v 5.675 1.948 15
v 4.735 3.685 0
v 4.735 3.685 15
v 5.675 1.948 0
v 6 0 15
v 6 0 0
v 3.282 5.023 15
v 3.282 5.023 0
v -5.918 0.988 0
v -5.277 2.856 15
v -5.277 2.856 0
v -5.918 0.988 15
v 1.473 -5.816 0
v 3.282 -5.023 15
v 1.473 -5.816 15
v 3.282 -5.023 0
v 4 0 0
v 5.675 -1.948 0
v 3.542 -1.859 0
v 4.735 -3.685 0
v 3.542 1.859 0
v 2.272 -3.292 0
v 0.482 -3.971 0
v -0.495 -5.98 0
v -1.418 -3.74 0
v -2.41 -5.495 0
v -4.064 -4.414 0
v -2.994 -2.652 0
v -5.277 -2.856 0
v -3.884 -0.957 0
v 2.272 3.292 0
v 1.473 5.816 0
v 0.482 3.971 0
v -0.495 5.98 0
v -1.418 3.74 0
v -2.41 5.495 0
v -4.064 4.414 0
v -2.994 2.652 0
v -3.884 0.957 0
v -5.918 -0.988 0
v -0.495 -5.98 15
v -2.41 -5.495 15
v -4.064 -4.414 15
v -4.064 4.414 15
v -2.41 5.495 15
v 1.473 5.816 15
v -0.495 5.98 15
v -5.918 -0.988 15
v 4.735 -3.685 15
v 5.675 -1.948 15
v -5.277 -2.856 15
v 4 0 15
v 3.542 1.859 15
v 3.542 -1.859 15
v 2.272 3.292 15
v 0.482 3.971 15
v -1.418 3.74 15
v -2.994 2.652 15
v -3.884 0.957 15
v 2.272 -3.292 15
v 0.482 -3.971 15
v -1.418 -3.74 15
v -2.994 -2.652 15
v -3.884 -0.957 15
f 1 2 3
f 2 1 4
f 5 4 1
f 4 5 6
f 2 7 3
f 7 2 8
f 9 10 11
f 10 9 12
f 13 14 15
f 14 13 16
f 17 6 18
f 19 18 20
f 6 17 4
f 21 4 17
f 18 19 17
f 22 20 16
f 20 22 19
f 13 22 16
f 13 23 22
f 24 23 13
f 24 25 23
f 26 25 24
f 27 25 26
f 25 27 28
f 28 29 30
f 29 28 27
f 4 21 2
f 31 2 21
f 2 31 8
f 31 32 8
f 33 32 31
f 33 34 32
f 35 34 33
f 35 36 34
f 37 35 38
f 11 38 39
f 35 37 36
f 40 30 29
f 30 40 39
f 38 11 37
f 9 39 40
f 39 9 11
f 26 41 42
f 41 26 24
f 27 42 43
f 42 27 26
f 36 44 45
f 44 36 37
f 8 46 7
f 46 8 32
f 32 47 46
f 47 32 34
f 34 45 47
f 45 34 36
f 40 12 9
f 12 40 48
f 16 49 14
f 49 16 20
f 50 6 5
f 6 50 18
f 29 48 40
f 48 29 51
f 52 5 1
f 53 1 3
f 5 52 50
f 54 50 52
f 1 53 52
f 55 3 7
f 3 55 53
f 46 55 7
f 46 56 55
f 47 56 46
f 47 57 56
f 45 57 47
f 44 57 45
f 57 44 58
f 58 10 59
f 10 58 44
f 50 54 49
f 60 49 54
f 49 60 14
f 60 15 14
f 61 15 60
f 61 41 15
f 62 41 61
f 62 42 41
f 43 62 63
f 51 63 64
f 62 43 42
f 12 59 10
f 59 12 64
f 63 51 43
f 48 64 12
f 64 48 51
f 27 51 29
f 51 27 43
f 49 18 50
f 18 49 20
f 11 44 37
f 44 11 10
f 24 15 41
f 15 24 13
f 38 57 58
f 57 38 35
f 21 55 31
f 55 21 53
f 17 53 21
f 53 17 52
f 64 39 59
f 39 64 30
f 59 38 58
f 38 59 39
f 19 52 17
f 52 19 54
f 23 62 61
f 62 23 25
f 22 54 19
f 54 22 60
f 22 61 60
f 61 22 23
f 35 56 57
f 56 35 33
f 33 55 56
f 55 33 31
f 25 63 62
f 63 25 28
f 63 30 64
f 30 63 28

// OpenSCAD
// BOSL-style tube() - hollow cylinder
module tube(h = 10, ir = 5, or = 8) {
    difference() {
        cylinder(h = h, r = or);
        translate([0, 0, -0.1])
            cylinder(h = h + 0.2, r = ir);
    }
}

tube(h = 15, ir = 4, or = 6);
